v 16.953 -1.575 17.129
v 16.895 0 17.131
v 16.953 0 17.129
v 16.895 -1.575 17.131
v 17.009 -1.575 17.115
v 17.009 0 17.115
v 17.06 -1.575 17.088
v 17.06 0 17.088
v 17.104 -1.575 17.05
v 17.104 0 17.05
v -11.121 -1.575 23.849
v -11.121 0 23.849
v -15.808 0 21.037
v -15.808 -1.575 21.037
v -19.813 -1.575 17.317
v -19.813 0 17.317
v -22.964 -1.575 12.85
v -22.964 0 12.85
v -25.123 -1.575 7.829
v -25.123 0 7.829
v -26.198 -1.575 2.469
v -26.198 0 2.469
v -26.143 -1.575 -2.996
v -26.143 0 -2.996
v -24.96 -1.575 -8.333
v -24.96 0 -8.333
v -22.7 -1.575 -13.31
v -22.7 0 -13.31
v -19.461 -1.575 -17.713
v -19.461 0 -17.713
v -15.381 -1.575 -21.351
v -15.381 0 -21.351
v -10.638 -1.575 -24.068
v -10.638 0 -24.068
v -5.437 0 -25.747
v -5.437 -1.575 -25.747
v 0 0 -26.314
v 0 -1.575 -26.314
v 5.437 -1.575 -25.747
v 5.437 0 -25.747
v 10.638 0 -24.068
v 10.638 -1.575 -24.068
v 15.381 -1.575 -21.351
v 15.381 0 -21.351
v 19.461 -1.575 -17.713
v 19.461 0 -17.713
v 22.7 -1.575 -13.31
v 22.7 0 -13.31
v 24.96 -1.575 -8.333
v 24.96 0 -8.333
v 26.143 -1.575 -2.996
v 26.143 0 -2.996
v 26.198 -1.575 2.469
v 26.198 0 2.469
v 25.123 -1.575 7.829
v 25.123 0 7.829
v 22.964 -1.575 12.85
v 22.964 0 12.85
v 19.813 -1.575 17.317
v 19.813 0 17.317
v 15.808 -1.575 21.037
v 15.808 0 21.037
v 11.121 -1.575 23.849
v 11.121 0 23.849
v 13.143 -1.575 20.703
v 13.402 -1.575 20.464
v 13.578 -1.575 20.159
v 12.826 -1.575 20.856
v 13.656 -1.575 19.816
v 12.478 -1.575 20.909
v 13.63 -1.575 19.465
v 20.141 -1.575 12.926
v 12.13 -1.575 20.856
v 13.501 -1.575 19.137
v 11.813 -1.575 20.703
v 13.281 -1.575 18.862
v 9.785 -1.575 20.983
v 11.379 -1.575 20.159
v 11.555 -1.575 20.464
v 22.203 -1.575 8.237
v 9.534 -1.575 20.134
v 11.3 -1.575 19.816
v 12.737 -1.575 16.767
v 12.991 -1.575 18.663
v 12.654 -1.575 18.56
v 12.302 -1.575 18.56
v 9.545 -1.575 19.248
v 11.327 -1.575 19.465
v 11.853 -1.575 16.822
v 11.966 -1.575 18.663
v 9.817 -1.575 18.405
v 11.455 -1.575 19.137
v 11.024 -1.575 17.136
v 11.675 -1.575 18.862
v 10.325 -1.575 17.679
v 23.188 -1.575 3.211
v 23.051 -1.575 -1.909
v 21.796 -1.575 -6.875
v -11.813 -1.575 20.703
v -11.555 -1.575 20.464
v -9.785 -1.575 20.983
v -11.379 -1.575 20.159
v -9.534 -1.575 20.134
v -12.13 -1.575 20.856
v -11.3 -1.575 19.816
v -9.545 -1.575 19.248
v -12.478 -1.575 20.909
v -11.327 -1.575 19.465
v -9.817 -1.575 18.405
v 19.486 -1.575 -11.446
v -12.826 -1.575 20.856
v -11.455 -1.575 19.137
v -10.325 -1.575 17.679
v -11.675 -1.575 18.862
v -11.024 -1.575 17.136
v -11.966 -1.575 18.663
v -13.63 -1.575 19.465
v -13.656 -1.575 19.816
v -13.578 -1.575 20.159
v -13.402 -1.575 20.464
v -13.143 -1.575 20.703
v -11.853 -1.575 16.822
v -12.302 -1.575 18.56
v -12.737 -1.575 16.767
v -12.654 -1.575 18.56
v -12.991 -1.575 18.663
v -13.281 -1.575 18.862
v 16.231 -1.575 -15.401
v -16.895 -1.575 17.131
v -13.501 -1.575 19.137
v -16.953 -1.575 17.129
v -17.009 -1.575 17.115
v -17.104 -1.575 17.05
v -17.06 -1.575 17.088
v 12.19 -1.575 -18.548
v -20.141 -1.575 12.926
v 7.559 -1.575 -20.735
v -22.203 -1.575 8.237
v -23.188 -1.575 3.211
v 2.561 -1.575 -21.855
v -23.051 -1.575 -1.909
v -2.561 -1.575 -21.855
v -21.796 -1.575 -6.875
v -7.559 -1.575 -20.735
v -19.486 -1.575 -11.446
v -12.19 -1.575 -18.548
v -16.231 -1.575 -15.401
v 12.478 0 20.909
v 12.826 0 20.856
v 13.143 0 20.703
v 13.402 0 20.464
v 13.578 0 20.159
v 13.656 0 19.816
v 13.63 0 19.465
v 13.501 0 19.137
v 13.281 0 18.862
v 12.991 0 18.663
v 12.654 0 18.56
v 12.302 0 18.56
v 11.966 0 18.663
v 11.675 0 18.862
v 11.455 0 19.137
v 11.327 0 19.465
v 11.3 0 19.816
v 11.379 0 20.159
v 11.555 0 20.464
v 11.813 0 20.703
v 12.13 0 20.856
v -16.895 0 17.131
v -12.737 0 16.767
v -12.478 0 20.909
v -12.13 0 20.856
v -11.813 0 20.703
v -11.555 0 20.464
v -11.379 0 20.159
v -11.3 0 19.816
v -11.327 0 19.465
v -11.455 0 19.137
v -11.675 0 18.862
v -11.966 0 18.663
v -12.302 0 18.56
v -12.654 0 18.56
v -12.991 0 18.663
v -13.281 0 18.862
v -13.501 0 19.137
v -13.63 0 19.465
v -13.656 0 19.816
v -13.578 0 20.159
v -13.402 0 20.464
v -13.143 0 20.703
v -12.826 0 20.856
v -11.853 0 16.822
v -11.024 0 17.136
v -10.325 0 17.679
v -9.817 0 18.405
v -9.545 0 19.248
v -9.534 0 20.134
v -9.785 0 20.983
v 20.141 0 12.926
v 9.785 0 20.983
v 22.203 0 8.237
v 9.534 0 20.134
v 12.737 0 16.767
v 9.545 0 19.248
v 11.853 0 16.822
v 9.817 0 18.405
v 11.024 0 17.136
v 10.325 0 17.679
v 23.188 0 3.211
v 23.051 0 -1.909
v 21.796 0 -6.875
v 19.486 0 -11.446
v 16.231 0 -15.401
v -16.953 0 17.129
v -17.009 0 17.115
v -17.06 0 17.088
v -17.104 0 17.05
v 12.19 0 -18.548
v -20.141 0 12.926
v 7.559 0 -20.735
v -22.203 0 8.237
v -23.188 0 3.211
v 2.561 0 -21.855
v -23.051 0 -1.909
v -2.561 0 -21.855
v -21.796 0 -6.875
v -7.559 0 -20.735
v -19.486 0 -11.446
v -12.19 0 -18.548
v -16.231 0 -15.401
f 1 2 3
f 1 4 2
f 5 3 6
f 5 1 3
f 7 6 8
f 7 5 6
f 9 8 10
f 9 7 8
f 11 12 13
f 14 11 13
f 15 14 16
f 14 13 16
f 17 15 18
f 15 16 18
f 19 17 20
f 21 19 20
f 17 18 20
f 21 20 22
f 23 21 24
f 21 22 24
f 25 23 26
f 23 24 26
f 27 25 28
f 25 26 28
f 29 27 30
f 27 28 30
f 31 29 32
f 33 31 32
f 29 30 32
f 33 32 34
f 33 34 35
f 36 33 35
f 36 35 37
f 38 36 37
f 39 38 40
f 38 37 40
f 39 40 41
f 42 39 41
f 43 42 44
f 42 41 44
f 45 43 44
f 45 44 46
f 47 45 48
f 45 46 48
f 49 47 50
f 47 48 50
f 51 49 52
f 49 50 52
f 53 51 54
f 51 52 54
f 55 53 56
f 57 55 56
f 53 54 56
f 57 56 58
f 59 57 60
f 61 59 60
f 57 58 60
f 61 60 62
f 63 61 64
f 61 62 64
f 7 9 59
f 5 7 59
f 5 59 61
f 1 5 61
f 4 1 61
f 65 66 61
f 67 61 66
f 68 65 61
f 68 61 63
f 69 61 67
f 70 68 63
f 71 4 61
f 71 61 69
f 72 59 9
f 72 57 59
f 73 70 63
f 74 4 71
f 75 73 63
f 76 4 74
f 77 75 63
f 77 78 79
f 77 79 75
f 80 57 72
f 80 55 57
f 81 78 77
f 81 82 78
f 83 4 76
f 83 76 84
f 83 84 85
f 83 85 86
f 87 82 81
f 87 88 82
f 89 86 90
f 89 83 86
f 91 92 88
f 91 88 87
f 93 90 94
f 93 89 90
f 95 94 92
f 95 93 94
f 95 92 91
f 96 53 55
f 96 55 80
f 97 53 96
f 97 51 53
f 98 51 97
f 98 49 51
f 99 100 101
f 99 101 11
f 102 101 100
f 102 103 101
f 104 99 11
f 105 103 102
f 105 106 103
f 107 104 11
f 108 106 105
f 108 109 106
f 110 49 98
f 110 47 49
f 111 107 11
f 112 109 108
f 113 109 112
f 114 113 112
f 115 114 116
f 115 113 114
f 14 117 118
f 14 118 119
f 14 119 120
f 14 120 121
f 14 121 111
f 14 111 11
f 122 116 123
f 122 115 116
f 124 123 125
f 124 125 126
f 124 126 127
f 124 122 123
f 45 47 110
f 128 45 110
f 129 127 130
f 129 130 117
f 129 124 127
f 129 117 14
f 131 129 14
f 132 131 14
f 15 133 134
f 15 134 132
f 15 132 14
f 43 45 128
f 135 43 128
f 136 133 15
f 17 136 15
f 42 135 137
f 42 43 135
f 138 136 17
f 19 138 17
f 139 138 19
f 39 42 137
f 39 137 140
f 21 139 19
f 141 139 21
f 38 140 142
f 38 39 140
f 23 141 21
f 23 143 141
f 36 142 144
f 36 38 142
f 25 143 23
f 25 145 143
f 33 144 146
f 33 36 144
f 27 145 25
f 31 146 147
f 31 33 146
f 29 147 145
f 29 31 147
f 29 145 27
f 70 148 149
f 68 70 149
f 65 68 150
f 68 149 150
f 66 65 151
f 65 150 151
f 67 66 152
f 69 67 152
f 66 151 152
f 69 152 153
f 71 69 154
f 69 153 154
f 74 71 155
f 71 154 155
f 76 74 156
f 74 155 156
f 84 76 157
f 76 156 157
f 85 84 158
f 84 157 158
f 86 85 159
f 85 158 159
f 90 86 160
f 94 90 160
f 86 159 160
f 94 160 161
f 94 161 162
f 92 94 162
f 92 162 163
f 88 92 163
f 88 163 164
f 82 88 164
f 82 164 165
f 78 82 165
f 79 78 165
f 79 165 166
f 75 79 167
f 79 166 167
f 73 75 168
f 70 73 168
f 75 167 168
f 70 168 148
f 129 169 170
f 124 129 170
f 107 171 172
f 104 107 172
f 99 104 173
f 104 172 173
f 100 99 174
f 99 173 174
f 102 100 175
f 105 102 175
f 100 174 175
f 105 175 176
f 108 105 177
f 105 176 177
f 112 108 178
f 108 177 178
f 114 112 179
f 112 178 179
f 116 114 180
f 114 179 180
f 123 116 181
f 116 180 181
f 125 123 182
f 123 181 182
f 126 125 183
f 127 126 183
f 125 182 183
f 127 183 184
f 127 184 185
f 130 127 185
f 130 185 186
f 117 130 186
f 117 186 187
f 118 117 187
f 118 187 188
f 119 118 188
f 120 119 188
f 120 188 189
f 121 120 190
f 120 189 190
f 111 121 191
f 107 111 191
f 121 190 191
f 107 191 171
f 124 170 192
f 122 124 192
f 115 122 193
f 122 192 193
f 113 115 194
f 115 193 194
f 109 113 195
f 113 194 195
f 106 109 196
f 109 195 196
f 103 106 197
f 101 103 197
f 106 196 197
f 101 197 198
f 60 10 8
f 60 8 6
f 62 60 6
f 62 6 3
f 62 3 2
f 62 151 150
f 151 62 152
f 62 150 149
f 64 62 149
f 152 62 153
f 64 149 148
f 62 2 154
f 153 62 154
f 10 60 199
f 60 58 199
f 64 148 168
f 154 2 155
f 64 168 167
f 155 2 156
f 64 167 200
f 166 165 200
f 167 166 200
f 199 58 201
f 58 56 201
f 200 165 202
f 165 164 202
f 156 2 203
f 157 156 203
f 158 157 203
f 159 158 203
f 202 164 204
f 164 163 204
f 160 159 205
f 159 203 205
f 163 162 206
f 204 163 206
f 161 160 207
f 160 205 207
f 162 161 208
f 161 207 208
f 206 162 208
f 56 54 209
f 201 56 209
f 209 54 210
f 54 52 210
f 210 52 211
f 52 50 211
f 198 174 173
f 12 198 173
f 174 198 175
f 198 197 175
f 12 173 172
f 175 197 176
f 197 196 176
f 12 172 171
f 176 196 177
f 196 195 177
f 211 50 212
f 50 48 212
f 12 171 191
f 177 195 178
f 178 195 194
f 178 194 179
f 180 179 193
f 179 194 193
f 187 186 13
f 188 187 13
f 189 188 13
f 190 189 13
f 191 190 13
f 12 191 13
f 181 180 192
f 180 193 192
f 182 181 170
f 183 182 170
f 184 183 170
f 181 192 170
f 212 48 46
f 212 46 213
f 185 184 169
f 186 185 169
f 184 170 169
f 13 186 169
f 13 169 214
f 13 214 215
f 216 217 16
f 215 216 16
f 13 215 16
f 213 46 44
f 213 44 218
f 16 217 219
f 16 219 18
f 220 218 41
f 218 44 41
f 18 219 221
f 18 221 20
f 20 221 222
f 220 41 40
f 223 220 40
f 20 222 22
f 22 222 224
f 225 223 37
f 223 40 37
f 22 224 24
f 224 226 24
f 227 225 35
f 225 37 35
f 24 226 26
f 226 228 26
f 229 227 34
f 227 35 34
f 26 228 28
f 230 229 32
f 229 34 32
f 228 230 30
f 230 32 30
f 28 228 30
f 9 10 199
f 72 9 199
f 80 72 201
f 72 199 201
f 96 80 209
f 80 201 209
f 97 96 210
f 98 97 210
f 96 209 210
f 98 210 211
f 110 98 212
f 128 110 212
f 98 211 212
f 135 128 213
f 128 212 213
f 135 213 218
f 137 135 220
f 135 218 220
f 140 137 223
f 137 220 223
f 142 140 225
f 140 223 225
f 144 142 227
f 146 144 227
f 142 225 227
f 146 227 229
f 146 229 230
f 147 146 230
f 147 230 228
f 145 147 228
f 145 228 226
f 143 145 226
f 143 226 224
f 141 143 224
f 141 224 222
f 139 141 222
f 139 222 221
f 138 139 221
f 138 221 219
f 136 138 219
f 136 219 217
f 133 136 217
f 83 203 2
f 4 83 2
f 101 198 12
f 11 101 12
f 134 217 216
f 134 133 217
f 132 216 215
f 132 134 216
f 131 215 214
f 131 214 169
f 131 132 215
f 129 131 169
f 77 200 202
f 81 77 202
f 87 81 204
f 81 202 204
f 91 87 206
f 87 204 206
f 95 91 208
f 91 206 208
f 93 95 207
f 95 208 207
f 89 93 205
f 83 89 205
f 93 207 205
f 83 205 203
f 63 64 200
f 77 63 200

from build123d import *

# Parameters (mm, degrees)
SKETCH2_R      = 1.1811
EXTRUDE1_DEPTH = 1.5748
FILLET1_R      = 0.254


with BuildPart() as part:
    # Sketch2 → Extrude1 (new body)
    with BuildSketch(Plane(origin=(0, 0, 0), x_dir=(1, 0, 0), z_dir=(0, 1, 0))):
        with BuildLine():
            Line((11.120945987, -23.848945631), (9.784734318, -20.98343046))
            ThreePointArc((9.784734318, -20.98343046), (10.043743754, -18.022939056), (12.737109235, -16.767002106))
            Line((12.737109235, -16.767002106), (17.019050922, -17.141623461))
            ThreePointArc((17.019050922, -17.141623461), (0, 21.9964), (-17.019050922, -17.141623461))
            Line((-17.019050922, -17.141623461), (-12.737109235, -16.767002106))
            ThreePointArc((-12.737109235, -16.767002106), (-10.043743754, -18.022939056), (-9.784734318, -20.98343046))
            Line((-9.784734318, -20.98343046), (-11.120945987, -23.848945631))
            ThreePointArc((-11.120945987, -23.848945631), (0, 26.3144), (11.120945987, -23.848945631))
        make_face()
        with Locations(Location((12.478099799, -19.727493509, 0), (0, 0, 270))):
            Circle(SKETCH2_R, mode=Mode.SUBTRACT)
        with Locations(Location((-12.478099799, -19.727493509, 0), (0, 0, 270))):
            Circle(SKETCH2_R, mode=Mode.SUBTRACT)
    extrude(amount=-EXTRUDE1_DEPTH)

    # Fillet1
    fillet1_edges = [part.edges().sort_by_distance(p)[0] for p in [
        (17.019050922, -0.7874, 17.141623461),
        (-17.019050922, -0.7874, 17.141623461),
    ]]
    fillet(fillet1_edges, radius=FILLET1_R)


solid = part.part
